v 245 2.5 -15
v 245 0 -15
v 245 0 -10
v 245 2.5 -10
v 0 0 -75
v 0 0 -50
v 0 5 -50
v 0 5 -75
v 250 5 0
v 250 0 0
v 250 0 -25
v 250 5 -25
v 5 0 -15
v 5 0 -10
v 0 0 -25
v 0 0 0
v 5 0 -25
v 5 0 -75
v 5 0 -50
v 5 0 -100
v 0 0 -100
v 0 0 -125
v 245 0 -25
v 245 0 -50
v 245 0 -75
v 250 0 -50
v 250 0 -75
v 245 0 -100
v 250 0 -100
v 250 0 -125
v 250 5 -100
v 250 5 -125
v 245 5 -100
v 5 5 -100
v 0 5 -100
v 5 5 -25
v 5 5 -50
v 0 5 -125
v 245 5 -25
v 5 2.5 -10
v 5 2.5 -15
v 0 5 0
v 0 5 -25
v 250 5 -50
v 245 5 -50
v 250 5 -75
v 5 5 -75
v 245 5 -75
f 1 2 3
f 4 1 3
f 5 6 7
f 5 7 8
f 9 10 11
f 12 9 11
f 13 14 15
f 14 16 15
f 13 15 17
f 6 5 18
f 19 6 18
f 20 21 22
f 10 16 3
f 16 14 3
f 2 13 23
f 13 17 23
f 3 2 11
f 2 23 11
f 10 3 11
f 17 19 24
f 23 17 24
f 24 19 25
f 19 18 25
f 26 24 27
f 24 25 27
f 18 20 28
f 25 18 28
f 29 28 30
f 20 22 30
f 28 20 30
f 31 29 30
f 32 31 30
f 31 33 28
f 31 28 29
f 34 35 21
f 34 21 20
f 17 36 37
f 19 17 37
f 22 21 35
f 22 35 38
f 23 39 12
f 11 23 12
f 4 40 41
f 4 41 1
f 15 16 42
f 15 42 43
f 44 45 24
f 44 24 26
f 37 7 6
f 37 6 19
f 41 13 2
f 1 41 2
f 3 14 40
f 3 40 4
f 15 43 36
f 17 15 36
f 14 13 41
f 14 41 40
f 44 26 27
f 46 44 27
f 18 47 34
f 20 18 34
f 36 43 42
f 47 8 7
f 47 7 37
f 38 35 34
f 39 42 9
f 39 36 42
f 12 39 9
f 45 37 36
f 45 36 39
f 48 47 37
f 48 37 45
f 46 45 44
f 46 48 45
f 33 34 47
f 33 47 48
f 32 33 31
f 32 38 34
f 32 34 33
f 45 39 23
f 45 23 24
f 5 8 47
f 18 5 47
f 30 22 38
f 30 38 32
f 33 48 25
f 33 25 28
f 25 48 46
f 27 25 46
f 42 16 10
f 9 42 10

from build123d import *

# Parameters (mm, degrees)
SKETCH3_W           = 250
SKETCH3_H           = 125
BOSS_EXTRUDE1_DEPTH = 5
SKETCH10_W          = 5
SKETCH10_H          = 25
CUT_EXTRUDE4_DEPTH  = 6
SKETCH11_W          = 240
SKETCH11_H          = 5
CUT_EXTRUDE5_DEPTH  = 2.5


with BuildPart() as part:
    # Sketch3 → Boss-Extrude1 (new body)
    with BuildSketch(Plane(origin=(0, 0, 0), x_dir=(1, 0, 0), z_dir=(0, 1, 0))):
        with Locations((125, 62.5)):
            Rectangle(SKETCH3_W, SKETCH3_H)
    extrude(amount=BOSS_EXTRUDE1_DEPTH)

    # Sketch10 → Cut-Extrude4 (cut, through all)
    with BuildSketch(Plane(origin=(0, 5, 0), x_dir=(1, 0, 0), z_dir=(0, 1, 0))):
        with Locations((2.5, 87.5)):
            Rectangle(SKETCH10_W, SKETCH10_H)
        with Locations((247.5, 37.5)):
            Rectangle(SKETCH10_W, SKETCH10_H)
        with Locations((2.5, 37.5)):
            Rectangle(SKETCH10_W, SKETCH10_H)
        with Locations((247.5, 87.5)):
            Rectangle(SKETCH10_W, SKETCH10_H)
    extrude(amount=-CUT_EXTRUDE4_DEPTH, mode=Mode.SUBTRACT)

    # Sketch11 → Cut-Extrude5 (cut)
    with BuildSketch(Plane.XZ):
        with Locations((125, -12.5)):
            Rectangle(SKETCH11_W, SKETCH11_H)
    extrude(amount=-CUT_EXTRUDE5_DEPTH, mode=Mode.SUBTRACT)


solid = part.part
